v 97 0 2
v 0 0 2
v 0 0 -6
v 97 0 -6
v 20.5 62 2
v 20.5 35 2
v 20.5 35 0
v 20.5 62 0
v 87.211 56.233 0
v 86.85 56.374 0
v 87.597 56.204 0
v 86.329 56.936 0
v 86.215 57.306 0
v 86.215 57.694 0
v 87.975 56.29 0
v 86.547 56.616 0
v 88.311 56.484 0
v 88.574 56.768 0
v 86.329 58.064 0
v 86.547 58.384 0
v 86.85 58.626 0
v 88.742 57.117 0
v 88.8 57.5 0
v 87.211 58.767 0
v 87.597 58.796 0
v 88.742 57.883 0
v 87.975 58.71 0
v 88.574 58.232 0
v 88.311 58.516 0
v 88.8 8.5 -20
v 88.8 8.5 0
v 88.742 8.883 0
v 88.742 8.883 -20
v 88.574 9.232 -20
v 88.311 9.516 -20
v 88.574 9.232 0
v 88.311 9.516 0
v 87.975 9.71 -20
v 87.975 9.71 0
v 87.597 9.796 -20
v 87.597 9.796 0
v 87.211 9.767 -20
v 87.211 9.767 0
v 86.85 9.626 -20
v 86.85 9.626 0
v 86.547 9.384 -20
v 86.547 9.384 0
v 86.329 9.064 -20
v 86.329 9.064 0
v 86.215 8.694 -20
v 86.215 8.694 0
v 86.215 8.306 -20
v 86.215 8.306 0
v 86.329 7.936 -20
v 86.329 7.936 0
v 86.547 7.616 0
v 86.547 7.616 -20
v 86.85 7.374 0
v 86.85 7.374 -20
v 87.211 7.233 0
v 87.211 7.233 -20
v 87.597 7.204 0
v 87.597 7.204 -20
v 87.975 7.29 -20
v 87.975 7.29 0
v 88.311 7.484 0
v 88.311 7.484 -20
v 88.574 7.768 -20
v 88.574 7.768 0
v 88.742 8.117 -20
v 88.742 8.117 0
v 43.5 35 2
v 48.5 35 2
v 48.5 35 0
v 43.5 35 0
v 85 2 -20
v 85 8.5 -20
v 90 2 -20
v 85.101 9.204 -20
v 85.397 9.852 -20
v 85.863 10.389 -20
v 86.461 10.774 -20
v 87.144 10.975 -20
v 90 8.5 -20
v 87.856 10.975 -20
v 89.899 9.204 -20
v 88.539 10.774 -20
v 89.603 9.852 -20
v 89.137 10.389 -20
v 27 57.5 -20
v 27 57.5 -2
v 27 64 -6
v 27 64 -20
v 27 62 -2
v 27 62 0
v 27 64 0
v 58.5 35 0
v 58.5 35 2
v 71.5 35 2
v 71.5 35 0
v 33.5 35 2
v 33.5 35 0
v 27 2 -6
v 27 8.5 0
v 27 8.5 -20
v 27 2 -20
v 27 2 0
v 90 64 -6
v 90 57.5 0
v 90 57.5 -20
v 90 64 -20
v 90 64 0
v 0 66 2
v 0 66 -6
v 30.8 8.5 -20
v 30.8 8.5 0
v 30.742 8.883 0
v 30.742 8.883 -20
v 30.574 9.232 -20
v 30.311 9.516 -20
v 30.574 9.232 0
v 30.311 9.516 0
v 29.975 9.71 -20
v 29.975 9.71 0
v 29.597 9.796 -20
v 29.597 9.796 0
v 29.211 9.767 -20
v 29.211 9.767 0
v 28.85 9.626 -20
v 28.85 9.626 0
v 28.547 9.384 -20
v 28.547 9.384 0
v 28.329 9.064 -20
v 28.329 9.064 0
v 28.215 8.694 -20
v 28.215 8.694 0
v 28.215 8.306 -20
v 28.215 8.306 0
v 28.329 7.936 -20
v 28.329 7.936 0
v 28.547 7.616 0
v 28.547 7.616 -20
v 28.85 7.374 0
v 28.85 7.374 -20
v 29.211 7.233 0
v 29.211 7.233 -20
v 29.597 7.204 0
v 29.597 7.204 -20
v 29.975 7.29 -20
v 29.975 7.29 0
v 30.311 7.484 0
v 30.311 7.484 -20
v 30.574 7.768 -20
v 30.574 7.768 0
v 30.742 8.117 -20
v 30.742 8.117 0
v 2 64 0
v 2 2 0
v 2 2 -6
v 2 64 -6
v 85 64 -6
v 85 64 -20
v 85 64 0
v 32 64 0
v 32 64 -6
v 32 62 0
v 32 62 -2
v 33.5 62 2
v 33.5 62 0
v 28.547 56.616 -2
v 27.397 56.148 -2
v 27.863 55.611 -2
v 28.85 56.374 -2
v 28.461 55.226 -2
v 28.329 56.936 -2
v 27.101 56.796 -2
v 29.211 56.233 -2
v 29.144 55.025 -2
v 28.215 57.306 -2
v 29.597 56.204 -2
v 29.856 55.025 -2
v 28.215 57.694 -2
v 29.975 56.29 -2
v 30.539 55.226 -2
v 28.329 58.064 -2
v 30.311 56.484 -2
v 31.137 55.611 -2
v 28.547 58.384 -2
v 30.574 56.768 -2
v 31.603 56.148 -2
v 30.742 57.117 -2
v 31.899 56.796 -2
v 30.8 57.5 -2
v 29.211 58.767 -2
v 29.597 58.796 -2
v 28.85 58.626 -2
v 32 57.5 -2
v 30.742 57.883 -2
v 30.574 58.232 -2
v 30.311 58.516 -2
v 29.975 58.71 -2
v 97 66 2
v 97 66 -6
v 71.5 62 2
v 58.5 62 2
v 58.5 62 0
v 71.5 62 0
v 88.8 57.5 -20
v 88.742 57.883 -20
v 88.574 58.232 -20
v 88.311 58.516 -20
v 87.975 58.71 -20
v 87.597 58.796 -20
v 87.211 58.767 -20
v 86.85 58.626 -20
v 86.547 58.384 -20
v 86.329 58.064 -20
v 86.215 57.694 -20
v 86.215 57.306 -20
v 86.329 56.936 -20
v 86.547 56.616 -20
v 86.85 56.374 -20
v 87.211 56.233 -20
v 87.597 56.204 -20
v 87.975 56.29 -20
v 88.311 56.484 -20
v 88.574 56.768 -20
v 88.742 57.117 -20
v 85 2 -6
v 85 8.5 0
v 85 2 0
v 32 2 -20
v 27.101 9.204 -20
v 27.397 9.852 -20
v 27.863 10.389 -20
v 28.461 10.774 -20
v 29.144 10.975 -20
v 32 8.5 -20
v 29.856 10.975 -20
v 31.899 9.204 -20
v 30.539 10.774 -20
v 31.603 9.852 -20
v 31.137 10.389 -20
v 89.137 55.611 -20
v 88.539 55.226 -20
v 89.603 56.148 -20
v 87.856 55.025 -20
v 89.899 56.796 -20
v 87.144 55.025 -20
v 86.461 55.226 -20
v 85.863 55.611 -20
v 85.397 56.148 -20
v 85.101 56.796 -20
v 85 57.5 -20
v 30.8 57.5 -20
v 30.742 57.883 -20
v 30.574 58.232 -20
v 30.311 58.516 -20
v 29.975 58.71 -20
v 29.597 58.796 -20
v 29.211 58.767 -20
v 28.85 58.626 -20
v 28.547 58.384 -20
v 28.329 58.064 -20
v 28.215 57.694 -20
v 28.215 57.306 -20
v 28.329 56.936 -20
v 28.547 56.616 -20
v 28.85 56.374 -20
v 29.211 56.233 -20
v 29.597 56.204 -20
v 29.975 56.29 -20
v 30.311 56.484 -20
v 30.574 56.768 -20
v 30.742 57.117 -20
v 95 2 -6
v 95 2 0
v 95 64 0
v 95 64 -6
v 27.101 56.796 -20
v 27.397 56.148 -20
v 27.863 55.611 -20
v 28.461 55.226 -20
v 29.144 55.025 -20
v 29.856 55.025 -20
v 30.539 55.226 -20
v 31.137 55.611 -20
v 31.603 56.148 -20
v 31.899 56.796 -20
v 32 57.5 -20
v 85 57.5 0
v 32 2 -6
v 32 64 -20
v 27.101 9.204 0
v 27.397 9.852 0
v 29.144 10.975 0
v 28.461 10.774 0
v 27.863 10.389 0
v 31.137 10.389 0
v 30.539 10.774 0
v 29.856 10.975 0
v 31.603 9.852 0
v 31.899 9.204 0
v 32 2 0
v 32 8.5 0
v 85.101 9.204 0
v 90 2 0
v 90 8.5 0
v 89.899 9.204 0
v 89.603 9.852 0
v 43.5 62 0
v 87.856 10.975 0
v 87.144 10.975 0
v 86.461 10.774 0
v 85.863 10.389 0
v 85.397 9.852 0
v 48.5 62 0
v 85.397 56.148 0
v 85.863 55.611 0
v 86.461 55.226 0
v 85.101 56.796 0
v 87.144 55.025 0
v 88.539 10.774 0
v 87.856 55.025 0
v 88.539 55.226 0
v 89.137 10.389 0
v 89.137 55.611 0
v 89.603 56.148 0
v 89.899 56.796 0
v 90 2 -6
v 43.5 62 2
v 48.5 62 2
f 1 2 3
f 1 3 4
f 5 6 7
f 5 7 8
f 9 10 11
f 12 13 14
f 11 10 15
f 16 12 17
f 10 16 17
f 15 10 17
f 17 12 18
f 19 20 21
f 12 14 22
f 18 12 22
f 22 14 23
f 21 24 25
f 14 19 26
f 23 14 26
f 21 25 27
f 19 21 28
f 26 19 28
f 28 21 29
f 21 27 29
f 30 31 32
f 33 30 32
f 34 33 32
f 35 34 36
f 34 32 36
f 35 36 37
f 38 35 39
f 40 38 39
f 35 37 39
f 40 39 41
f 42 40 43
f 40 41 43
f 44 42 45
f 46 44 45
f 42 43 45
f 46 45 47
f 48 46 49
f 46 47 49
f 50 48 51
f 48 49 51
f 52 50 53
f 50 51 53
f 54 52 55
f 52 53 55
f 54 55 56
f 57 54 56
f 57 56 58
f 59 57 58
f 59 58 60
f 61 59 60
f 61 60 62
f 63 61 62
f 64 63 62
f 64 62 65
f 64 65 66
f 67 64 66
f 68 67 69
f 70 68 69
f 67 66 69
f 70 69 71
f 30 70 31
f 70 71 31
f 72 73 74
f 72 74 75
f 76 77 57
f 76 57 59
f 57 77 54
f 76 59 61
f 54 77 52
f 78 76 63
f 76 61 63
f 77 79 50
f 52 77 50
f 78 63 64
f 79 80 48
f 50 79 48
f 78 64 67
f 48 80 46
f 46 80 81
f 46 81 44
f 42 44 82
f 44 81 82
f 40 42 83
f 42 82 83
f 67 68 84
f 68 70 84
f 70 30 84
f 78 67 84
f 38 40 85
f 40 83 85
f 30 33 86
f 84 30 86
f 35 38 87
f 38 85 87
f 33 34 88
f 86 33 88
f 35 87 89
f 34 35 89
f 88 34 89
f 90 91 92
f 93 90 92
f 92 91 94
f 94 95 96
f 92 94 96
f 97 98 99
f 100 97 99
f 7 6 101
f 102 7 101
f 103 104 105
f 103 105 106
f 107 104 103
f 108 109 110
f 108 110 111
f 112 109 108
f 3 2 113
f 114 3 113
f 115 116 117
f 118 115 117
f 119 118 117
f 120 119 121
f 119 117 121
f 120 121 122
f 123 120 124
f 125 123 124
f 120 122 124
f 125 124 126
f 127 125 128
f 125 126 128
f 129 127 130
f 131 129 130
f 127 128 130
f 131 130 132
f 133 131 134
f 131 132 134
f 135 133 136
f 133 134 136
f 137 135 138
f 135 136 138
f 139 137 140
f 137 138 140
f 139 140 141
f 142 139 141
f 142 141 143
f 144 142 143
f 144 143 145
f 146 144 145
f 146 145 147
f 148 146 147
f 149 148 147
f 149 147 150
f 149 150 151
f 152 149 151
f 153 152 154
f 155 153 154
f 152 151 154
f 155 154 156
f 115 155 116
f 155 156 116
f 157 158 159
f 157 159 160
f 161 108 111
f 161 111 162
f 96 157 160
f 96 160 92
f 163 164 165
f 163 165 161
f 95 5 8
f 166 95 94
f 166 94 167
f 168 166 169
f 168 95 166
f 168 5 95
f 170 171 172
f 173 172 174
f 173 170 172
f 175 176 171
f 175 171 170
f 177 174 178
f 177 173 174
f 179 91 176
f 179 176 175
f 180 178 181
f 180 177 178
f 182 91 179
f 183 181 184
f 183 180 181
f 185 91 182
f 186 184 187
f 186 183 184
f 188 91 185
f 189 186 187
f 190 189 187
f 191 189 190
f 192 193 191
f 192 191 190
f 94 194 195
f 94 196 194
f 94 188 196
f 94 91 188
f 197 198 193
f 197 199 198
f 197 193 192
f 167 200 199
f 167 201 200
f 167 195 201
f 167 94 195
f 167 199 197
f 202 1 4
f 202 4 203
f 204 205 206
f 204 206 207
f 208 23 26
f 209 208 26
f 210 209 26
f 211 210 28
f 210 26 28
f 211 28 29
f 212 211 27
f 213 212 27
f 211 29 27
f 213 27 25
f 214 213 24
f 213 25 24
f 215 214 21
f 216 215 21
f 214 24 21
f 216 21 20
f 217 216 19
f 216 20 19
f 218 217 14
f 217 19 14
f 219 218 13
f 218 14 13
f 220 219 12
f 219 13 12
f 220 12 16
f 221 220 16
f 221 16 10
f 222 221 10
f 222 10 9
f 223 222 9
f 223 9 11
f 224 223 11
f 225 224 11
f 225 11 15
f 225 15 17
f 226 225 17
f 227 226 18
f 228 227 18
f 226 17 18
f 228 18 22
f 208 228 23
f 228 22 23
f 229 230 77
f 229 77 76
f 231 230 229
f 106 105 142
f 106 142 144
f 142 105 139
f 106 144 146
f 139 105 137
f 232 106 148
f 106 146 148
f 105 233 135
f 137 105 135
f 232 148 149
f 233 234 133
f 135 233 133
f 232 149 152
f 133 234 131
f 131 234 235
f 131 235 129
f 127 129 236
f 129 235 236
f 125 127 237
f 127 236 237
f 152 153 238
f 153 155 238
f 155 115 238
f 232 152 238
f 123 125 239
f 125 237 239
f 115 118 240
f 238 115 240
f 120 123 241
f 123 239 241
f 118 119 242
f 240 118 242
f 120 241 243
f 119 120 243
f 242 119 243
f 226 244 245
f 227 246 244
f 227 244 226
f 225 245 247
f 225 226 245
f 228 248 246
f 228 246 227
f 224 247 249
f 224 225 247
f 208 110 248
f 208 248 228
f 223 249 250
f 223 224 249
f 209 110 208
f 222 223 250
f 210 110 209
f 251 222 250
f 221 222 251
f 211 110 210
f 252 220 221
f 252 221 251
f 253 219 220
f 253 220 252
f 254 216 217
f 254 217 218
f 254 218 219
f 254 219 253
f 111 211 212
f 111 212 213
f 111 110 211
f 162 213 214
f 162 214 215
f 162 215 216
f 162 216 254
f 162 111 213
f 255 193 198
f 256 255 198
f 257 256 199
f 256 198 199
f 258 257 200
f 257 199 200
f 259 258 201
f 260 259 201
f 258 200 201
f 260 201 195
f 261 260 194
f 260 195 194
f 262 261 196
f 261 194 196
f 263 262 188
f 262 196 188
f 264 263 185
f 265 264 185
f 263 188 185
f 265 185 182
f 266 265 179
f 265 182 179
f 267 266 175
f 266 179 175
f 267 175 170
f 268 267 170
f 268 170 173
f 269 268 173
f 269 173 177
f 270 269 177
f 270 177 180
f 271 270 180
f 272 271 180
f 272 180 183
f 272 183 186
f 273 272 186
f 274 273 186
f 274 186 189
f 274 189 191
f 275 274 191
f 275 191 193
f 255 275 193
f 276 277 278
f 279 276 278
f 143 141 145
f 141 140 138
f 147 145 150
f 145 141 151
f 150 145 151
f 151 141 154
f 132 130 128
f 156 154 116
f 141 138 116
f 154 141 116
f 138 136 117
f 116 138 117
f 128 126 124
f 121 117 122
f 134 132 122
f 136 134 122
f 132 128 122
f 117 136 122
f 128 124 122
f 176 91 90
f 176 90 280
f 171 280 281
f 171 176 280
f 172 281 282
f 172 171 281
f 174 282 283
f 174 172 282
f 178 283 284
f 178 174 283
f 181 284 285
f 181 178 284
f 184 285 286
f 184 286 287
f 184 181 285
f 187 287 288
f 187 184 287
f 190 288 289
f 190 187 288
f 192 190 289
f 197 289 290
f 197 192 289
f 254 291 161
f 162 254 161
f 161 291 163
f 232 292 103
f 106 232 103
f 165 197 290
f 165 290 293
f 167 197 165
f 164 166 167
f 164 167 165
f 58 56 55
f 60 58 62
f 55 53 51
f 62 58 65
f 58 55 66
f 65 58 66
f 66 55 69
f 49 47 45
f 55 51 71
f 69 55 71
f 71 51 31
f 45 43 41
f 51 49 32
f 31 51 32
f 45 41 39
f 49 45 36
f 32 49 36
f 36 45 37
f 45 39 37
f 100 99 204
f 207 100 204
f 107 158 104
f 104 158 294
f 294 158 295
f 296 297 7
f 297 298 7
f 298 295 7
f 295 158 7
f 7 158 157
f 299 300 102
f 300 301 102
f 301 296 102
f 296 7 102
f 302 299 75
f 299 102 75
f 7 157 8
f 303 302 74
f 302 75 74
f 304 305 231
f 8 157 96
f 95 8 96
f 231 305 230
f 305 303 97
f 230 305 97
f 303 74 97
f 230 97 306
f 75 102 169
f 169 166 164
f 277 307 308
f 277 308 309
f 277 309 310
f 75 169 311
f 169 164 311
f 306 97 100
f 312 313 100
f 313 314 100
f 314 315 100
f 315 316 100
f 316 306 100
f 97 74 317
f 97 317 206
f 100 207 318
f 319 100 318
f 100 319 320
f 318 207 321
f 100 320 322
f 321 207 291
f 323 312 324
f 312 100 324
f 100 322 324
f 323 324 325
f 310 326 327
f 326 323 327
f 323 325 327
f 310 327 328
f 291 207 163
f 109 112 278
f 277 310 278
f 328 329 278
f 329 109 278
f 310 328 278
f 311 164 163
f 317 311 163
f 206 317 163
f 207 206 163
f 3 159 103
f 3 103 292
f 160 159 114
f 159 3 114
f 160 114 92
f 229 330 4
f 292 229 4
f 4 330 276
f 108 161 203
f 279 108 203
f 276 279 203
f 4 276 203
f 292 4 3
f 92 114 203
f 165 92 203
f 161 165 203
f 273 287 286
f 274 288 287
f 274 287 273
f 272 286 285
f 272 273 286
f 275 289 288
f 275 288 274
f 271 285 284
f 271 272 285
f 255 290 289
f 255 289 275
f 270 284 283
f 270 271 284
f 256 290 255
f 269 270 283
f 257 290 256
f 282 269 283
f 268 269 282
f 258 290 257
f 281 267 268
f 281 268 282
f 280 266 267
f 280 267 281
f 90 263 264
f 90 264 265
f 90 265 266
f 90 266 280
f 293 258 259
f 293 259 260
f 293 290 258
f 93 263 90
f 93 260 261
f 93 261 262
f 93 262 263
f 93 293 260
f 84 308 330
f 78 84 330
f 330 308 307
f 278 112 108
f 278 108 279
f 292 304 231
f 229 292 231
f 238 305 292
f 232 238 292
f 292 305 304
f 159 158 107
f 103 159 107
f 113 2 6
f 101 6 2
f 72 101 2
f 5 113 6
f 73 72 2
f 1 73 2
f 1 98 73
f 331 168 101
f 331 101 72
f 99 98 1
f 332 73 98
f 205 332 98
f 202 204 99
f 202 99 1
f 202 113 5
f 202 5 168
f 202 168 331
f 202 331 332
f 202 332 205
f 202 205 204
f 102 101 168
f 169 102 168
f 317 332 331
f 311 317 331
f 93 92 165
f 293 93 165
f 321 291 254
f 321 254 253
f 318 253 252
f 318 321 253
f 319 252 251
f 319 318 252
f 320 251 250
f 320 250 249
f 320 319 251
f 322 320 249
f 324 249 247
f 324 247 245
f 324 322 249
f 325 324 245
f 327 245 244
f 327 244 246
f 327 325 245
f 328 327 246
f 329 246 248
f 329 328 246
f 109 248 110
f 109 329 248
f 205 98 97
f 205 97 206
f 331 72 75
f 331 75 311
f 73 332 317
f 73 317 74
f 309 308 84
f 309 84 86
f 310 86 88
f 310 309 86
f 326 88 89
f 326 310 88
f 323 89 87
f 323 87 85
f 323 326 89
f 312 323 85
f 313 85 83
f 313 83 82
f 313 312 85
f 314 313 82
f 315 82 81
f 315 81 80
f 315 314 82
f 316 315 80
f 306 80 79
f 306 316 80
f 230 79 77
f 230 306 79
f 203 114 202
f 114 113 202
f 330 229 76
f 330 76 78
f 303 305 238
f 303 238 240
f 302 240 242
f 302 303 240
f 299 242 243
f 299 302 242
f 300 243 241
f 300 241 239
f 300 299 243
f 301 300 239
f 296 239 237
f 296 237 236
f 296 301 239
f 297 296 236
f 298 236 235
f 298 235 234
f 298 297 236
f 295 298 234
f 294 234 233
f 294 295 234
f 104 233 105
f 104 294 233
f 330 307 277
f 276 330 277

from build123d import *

# Parameters (mm, degrees)
BOX_W           = 97
BOX_H           = 66
BOX_DEPTH       = 2
SKETCH015_W     = 97
SKETCH015_H     = 66
SKETCH015_W_2   = 93
SKETCH015_H_2   = 62
PAD012_DEPTH    = 6
SKETCH016_R     = 1.3
PAD013_DEPTH    = 20
SKETCH014_W     = 13
SKETCH014_H     = 27
POCKET004_DEPTH = 4


with BuildPart() as part:
    # Box → Box (join)
    with BuildSketch(Plane.XY):
        with Locations((48.5, 33)):
            Rectangle(BOX_W, BOX_H)
    extrude(amount=BOX_DEPTH)

    # Sketch015 → Pad012 (join)
    with BuildSketch(Plane.XY):
        with Locations((48.5, 33)):
            Rectangle(SKETCH015_W, SKETCH015_H)
        with Locations((48.5, 33)):
            Rectangle(SKETCH015_W_2, SKETCH015_H_2, mode=Mode.SUBTRACT)
    extrude(amount=-PAD012_DEPTH)

    # Sketch016 → Pad013 (join)
    with BuildSketch(Plane.XY):
        with BuildLine():
            Line((27, 57.5), (27, 64))
            Line((27, 64), (32, 64))
            Line((32, 57.5), (32, 64))
            ThreePointArc((27, 57.5), (29.5, 55), (32, 57.5))
        make_face()
        with Locations((29.5, 57.5)):
            Circle(SKETCH016_R, mode=Mode.SUBTRACT)
        with BuildLine():
            Line((85, 57.5), (85, 64))
            Line((90, 64), (85, 64))
            Line((90, 57.5), (90, 64))
            ThreePointArc((85, 57.5), (87.5, 55), (90, 57.5))
        make_face()
        with Locations((87.5, 57.5)):
            Circle(SKETCH016_R, mode=Mode.SUBTRACT)
        with BuildLine():
            ThreePointArc((90, 8.5), (87.5, 11), (85, 8.5))
            Line((85, 8.5), (85, 2))
            Line((85, 2), (90, 2))
            Line((90, 8.5), (90, 2))
        make_face()
        with Locations((87.5, 8.5)):
            Circle(SKETCH016_R, mode=Mode.SUBTRACT)
        with BuildLine():
            Line((27, 8.5), (27, 2))
            Line((32, 2), (27, 2))
            Line((32, 8.5), (32, 2))
            ThreePointArc((32, 8.5), (29.5, 11), (27, 8.5))
        make_face()
        with Locations((29.5, 8.5)):
            Circle(SKETCH016_R, mode=Mode.SUBTRACT)
    extrude(amount=-PAD013_DEPTH)

    # Sketch014 → Pocket004 (cut)
    with BuildSketch(Plane.XY.offset(2)):
        Polygon((48.5, 62), (48.5, 35), (43.5, 35), (43.5, 62), (46, 62), align=None)
        with Locations((27, 48.5)):
            Rectangle(SKETCH014_W, SKETCH014_H)
        with Locations((65, 48.5)):
            Rectangle(SKETCH014_W, SKETCH014_H)
    extrude(amount=-POCKET004_DEPTH, mode=Mode.SUBTRACT)


solid = part.part
